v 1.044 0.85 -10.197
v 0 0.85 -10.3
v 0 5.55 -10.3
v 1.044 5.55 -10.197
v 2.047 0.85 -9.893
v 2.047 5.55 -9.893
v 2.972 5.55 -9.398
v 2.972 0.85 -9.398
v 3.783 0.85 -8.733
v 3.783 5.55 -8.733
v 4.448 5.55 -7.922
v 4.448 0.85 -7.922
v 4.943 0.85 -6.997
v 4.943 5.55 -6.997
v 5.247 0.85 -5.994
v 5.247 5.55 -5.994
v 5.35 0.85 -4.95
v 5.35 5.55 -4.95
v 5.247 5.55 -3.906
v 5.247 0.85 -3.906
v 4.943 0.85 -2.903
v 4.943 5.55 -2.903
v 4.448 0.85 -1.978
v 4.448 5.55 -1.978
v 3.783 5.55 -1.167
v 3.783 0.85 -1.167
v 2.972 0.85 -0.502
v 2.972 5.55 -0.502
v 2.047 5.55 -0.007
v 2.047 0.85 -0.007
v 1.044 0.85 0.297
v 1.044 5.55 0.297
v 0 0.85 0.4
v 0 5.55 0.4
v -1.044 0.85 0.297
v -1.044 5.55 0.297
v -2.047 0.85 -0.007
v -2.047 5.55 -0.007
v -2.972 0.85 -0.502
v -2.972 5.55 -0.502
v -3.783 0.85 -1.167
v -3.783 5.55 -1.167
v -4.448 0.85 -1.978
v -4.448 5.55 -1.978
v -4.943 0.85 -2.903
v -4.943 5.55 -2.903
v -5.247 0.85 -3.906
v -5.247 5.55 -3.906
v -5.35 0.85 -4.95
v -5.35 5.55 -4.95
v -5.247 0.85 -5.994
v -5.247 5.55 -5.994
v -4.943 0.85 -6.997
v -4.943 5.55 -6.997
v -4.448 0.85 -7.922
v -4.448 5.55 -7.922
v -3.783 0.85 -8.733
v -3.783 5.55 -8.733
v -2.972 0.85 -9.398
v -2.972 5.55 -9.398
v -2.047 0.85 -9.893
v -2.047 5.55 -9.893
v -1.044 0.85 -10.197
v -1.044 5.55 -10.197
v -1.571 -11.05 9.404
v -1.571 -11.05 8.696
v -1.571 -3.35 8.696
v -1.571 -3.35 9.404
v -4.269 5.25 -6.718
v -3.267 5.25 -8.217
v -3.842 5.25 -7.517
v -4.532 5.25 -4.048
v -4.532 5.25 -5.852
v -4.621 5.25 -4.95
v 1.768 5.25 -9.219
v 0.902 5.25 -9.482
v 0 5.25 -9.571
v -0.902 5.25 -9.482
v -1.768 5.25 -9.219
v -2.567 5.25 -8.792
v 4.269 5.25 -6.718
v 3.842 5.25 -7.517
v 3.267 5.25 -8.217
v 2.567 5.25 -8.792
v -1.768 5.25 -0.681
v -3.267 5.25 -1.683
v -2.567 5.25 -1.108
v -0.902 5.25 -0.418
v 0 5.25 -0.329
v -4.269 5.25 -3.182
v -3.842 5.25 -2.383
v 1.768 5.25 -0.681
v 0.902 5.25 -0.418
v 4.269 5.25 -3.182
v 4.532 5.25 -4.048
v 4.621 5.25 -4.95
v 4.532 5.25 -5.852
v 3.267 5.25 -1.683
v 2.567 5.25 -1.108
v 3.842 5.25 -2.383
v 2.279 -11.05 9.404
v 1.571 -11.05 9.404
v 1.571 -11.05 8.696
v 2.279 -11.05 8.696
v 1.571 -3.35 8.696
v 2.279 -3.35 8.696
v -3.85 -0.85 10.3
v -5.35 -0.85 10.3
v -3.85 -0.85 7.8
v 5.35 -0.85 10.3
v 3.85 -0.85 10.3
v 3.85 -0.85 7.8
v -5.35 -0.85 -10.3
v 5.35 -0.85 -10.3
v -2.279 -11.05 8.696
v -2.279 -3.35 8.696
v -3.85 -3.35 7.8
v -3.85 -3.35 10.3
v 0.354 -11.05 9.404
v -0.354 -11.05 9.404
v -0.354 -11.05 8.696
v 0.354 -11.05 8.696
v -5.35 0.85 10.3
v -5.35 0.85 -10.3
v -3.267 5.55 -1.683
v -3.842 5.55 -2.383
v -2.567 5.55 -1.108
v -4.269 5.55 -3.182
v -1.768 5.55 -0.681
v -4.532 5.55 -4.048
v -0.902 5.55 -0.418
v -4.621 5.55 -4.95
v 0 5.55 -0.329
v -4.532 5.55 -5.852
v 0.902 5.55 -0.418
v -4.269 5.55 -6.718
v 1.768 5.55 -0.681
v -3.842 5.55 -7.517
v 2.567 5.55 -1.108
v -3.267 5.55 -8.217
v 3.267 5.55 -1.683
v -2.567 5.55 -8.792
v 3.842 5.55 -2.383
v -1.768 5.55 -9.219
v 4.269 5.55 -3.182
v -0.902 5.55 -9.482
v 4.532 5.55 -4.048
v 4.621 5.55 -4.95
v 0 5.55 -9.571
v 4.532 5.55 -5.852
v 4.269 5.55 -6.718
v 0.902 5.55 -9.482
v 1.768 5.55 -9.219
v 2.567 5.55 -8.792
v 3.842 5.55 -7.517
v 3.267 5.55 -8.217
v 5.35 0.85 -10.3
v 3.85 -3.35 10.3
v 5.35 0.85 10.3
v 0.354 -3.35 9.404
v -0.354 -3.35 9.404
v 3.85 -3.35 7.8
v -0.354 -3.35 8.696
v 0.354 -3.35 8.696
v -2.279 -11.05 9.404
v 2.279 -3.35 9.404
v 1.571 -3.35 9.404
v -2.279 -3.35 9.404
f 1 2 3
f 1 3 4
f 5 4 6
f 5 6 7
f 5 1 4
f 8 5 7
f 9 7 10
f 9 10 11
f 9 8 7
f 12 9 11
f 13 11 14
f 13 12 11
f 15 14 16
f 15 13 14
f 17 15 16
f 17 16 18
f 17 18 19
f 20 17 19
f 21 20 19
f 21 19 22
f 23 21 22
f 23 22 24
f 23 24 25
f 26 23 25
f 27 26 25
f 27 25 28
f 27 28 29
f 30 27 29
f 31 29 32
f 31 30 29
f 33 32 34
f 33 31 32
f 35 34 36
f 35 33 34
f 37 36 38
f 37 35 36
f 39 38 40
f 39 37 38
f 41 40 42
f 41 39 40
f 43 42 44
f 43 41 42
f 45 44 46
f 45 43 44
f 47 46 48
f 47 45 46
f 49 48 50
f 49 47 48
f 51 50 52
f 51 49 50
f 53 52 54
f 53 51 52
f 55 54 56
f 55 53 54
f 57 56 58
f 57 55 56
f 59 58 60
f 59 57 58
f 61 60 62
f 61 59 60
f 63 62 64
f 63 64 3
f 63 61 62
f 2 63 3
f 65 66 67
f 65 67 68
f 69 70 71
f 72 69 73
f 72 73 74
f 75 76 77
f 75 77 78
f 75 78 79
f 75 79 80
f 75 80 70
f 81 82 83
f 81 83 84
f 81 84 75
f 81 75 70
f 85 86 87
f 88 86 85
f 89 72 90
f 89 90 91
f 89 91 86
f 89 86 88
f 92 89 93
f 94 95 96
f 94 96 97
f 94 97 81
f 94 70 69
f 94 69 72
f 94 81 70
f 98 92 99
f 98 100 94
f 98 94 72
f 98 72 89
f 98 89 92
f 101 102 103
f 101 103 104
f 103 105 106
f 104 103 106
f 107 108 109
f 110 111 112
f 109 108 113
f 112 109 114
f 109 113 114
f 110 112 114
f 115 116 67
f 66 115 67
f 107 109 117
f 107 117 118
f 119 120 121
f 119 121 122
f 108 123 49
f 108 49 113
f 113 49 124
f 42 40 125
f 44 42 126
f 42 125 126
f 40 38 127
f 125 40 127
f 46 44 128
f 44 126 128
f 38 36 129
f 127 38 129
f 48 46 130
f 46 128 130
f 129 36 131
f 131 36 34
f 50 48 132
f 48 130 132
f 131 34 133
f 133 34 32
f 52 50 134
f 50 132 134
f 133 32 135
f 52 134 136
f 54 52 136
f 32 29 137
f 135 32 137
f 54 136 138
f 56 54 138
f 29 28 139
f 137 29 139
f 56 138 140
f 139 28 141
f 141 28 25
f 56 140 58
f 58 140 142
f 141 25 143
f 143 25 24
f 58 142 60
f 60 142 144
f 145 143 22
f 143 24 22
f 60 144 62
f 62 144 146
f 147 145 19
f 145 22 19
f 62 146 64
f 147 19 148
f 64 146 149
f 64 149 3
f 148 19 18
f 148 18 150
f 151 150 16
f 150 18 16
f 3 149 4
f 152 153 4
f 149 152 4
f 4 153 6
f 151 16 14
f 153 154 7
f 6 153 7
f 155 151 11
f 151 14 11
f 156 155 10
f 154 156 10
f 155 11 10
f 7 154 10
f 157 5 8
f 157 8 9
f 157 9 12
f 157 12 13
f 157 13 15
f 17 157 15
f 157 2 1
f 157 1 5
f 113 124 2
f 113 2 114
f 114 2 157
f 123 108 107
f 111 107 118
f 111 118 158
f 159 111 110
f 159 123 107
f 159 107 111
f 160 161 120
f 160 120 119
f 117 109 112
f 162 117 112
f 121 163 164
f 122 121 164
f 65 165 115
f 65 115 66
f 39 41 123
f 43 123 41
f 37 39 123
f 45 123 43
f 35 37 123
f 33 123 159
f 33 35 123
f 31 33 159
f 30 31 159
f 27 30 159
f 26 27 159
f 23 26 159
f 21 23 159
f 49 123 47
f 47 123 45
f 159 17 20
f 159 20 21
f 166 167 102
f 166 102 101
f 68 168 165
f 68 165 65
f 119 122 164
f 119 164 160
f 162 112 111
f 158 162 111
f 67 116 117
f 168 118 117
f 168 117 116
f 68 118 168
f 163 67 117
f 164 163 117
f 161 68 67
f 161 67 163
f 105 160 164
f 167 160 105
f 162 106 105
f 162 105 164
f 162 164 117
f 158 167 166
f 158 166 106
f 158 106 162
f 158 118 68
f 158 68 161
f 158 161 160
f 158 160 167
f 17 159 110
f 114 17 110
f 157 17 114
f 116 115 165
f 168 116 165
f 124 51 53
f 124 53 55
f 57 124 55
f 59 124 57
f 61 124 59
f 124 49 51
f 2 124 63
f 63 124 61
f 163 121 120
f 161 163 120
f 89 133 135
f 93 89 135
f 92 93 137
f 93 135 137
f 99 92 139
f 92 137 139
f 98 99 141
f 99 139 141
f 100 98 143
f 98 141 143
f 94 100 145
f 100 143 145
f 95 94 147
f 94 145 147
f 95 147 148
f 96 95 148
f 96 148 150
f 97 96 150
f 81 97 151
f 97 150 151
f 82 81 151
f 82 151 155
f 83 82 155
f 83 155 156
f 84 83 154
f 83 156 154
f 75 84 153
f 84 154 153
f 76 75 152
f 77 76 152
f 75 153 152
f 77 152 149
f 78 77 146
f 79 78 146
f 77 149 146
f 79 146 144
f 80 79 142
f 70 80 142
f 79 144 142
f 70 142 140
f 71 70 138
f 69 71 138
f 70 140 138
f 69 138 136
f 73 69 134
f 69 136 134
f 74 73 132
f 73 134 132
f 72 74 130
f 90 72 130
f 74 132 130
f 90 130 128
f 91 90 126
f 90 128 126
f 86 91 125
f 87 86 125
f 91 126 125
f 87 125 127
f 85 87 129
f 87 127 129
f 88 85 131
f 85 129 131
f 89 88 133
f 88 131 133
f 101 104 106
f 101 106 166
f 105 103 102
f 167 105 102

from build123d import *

# Parameters (mm, degrees)
SKETCH1_W           = 10.7
SKETCH1_H           = 20.6
BOSS_EXTRUDE1_DEPTH = 0.85
SKETCH2_R           = 5.35
BOSS_EXTRUDE2_DEPTH = 6.4
SKETCH3_W           = 7.7
SKETCH3_H           = 2.5
BOSS_EXTRUDE3_DEPTH = 2.5
SKETCH4_W           = 0.707106782
SKETCH4_H           = 0.707106782
BOSS_EXTRUDE4_DEPTH = 7.7
SKETCH5_R           = 4.620940101
CUT_EXTRUDE1_DEPTH  = 0.3


with BuildPart() as part:
    # Sketch1 → Boss-Extrude1 (new, symmetric)
    with BuildSketch(Plane(origin=(0, 0, 0), x_dir=(1, 0, 0), z_dir=(0, 1, 0))):
        Rectangle(SKETCH1_W, SKETCH1_H)
    extrude(amount=BOSS_EXTRUDE1_DEPTH, both=True)

    # Sketch2 → Boss-Extrude2 (add)
    with BuildSketch(Plane.XZ.offset(0.85)):
        with Locations(Location((0, -4.95, 0), (0, 0, 270))):
            Circle(SKETCH2_R)
    extrude(amount=-BOSS_EXTRUDE2_DEPTH)

    # Sketch3 → Boss-Extrude3 (add)
    with BuildSketch(Plane.XZ.offset(0.85)):
        with Locations((0, 9.05)):
            Rectangle(SKETCH3_W, SKETCH3_H)
    extrude(amount=BOSS_EXTRUDE3_DEPTH)

    # Sketch4 → Boss-Extrude4 (add)
    with BuildSketch(Plane.XZ.offset(3.35)):
        with Locations((-1.925, 9.05)):
            Rectangle(SKETCH4_W, SKETCH4_H)
        with Locations((0, 9.05)):
            Rectangle(SKETCH4_W, SKETCH4_H)
        with Locations((1.925, 9.05)):
            Rectangle(SKETCH4_W, SKETCH4_H)
    extrude(amount=BOSS_EXTRUDE4_DEPTH)

    # Sketch5 → Cut-Extrude1 (cut)
    with BuildSketch(Plane(origin=(0, 5.55, 0), x_dir=(1, 0, 0), z_dir=(0, 1, 0))):
        with Locations(Location((0, 4.95, 0), (0, 0, 270))):
            Circle(SKETCH5_R)
    extrude(amount=-CUT_EXTRUDE1_DEPTH, mode=Mode.SUBTRACT)


solid = part.part
